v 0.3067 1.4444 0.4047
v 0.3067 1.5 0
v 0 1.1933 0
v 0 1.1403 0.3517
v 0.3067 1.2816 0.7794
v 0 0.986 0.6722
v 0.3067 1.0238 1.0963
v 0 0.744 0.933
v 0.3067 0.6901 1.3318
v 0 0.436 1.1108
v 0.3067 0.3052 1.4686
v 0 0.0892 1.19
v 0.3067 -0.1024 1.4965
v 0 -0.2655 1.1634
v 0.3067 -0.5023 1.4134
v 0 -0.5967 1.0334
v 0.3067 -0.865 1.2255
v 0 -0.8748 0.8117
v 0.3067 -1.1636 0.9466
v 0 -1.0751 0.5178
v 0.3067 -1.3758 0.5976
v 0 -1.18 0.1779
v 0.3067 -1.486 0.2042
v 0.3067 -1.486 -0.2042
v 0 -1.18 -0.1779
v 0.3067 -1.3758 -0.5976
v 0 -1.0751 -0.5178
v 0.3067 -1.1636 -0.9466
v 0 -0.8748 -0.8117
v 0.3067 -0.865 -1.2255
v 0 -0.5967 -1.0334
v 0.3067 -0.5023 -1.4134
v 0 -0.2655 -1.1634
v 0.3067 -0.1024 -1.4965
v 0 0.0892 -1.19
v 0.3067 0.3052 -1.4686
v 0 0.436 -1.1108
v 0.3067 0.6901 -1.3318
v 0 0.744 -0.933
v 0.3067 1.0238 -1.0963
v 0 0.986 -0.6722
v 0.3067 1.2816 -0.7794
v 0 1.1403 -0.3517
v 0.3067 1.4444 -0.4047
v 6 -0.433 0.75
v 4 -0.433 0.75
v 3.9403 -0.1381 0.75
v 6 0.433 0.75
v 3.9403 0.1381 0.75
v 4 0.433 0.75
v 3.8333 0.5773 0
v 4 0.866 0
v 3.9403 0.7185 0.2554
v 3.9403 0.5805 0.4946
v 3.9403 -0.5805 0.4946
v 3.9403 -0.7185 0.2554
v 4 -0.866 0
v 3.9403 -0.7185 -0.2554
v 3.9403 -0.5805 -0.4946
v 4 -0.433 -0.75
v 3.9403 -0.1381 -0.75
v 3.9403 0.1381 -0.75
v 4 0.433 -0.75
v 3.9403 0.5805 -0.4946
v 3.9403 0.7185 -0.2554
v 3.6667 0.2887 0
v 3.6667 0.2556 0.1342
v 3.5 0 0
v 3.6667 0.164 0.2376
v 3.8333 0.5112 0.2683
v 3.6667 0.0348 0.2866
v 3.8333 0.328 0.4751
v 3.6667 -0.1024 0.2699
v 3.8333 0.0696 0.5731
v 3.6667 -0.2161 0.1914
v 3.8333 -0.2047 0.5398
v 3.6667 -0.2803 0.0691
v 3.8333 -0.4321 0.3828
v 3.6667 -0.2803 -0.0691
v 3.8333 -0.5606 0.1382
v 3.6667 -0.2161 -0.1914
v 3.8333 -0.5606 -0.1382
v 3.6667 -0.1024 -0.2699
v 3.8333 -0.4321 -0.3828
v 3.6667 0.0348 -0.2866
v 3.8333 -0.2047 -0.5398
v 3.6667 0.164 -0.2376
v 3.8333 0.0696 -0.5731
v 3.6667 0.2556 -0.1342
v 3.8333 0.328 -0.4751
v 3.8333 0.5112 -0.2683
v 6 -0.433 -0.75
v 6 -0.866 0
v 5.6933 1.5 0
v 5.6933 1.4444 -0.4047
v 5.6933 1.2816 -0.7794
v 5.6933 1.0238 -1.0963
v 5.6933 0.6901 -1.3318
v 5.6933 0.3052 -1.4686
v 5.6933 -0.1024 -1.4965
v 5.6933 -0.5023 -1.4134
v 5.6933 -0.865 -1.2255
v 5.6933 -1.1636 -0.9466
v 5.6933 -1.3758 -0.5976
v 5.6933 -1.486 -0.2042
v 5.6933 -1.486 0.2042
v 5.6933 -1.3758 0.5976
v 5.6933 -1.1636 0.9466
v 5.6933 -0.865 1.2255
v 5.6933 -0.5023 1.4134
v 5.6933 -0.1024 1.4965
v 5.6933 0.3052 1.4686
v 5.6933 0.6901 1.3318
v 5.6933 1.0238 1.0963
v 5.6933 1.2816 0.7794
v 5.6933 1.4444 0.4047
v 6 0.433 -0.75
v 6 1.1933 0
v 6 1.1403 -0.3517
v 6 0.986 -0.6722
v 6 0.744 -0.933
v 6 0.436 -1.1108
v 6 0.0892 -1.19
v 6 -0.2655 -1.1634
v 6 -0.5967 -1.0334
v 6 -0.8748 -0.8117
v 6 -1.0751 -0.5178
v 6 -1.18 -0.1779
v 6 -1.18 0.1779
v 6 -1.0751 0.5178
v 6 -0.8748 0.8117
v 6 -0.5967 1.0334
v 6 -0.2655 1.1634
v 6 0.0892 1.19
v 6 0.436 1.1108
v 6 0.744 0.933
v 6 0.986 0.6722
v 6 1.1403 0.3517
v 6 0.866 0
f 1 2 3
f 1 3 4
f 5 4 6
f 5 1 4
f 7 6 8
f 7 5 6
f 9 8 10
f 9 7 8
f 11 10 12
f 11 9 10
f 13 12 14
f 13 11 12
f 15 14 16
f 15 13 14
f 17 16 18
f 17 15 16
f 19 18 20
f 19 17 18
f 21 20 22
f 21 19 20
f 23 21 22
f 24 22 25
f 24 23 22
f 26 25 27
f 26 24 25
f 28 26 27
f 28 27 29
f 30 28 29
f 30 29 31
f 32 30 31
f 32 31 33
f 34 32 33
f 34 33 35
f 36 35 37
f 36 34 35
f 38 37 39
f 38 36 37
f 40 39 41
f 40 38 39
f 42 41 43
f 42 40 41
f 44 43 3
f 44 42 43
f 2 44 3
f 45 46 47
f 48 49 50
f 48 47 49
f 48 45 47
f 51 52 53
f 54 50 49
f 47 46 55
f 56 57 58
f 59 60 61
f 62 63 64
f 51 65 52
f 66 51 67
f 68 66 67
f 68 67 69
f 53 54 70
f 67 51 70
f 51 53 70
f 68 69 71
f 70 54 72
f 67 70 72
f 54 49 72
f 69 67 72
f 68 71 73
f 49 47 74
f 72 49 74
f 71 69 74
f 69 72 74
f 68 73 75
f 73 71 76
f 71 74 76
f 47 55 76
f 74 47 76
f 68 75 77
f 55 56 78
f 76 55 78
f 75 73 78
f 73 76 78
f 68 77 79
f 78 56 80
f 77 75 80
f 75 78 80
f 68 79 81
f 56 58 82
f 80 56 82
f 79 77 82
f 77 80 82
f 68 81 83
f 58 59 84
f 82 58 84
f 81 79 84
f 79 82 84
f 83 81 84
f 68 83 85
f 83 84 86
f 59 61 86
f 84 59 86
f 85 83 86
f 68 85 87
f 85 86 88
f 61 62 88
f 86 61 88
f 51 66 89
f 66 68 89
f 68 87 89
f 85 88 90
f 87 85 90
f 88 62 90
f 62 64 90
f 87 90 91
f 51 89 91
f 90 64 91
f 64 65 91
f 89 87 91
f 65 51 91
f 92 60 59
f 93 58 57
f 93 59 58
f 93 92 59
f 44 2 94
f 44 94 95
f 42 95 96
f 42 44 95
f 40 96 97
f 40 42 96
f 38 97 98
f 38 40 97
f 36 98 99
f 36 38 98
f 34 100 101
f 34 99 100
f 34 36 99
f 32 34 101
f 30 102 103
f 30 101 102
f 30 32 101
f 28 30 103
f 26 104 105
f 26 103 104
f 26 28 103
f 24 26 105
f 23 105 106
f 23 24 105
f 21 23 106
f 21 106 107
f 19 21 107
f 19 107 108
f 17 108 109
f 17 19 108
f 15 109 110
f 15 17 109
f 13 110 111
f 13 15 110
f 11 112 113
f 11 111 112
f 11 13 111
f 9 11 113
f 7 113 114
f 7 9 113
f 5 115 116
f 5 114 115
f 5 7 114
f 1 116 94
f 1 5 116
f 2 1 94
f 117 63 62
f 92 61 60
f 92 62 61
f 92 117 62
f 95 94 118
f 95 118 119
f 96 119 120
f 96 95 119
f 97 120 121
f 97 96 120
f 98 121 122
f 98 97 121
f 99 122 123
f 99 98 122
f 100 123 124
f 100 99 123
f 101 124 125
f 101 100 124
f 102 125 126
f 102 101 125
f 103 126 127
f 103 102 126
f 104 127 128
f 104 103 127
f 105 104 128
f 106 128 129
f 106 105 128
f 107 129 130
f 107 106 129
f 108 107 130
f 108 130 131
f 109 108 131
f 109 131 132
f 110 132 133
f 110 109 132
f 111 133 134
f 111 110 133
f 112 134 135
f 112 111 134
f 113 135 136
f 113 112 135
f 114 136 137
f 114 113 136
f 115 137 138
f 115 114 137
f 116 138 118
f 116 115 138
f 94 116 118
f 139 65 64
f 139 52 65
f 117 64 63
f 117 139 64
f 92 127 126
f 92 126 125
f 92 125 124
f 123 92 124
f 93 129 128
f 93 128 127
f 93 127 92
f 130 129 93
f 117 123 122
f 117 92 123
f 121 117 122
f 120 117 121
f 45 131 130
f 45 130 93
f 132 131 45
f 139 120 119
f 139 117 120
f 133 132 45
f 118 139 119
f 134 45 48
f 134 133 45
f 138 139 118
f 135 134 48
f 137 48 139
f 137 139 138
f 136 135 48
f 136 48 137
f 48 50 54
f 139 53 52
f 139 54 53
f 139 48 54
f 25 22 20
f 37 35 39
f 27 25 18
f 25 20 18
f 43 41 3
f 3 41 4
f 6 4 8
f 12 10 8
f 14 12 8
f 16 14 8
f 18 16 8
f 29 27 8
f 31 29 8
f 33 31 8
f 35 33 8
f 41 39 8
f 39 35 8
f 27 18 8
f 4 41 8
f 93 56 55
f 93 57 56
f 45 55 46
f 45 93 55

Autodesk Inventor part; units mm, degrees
ref_plane "YZ Plane" through (0, 0, 0) normal (1, 0, 0) x (0, 1, 0)
ref_plane "XZ Plane" through (0, 0, 0) normal (0, 1, 0) x (-1, 0, 0)
sketch "Skizze1" plane through (0, 0, 0) normal (0, 0, 1) x (1, 0, 0)
  line L0 (0, 0) -> (3.5, 0)
  line L1 (6, 0.866) -> (6, 1.5)
  line L2 (6, 1.5) -> (0, 1.5)
  line L3 (6, 0.866) -> (4, 0.866)
  line L4 (4, 0.866) -> (3.5, 0)
  line L5 (0, -0.3) -> (0, 1.8) projected
  line L6 (0, 1.5) -> (0, 0)
  dimension "d0" = 2
  dimension "d1" = 60
  dimension "d2" = 3
  dimension "d3" = 1.7321
  dimension "d5" = 6
revolve "Körper" add sketch "Skizze1" angle 360 about axis through (0, 0, 0) along (1, 0, 0)
sketch "Skizze2" plane through (6, 0, 0) normal (1, 0, 0) x (0, 1, 0)
  circle A0 centre (0, 0) radius 0.866 projected
  line L0 (-0.433, 0.75) -> (0.433, 0.75)
  line L1 (0.433, 0.75) -> (0.866, 0)
  line L2 (0.866, 0) -> (0.433, -0.75)
  line L3 (0.433, -0.75) -> (-0.433, -0.75)
  line L4 (-0.433, -0.75) -> (-0.866, 0)
  line L5 (-0.866, 0) -> (-0.433, 0.75)
  point P0 (0, 0)
  point P1 (0, 0)
extrude "Loch" add sketch "Skizze2" against normal up to next contours L1 A0 | A0 L2 | L0 A0 | A0 L3 | L5 A0 | A0 L4
thread "Gewinde" size "M3x0.5" class "6g" standard "ISO Metric profile" length 6
chamfer "Fase1" distance 0.3067 angle 45 1 edges at (6, -1.5, 0) measured on face at (4, 1.4951, -0.1207)
chamfer "Fase2" distance 0.3067 angle 45 1 edges at (0, -1.5, 0) measured on face at (1.8978, 1.4951, -0.1207)
ref_plane "Work Plane1" through (3, 0, 0) normal (0, 0, 1) x (1, 0, 0)
equation "\"d0\" = INTI"
equation "\"d2\" = NND"
equation "\"d3\" = 1.1547 * SW"
equation "\"d5\" = NLG"
equation "\"d8\" = NLG"
equation "\"d10\" = -0.5 * GD1 + 0.5 * NND"
equation "\"d11\" = FAWI"
equation "\"d34\" = -0.5 * GD1 + 0.5 * NND"
equation "\"d12\" = -0.5 * GD1 + 0.5 * NND"
equation "\"d13\" = FAWI"
equation "\"d35\" = -0.5 * GD1 + 0.5 * NND"
equation "\"NND\" = 3"
equation "\"NLG\" = 6"
equation "\"INTI\" = 2"
equation "\"FAWI\" = 45deg"
equation "\"SW\" = 1.5"
equation "\"GD1\" = THREADDIA - 1.2269 * PTC"
equation "\"SPD\" = 2"
equation "\"GUL\" = 0.61345 * PTC"
equation "\"TOA\" = 30deg"
equation "\"THREADDIA\" = 3"
equation "\"PTC\" = 0.5"
equation "\"FAWI1\" = 45deg"
equation "\"GAL\" = 0.61345 * PTC"
equation "\"E0\" = 1.155 * SW"
properties part number "DIN 913 - M3 x 6" material "Stahl, weich"
